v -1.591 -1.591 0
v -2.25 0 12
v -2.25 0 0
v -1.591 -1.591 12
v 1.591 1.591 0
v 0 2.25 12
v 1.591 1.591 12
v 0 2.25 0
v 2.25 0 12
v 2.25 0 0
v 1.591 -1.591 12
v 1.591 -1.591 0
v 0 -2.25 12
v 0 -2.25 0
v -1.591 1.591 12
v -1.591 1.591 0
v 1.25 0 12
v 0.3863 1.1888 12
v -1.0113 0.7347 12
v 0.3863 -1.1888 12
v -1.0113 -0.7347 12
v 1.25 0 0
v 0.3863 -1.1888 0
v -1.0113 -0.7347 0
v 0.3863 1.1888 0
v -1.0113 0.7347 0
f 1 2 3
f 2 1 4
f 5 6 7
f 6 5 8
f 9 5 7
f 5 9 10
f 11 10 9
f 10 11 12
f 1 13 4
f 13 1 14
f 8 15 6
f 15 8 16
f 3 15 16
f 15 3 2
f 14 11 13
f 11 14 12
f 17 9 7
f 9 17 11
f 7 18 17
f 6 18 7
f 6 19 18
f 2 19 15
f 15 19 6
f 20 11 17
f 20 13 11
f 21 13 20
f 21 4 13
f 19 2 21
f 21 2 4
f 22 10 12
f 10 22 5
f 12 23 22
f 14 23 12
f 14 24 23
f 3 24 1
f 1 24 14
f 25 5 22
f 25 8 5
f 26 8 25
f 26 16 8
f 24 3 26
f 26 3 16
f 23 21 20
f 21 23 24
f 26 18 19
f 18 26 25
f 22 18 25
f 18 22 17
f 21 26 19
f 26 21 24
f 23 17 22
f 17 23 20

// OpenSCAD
// Uncomment before final render
//$fa = 0.01;
//$fs = 0.25;

module xAxisCameraSpacer() {
  difference() {
    cylinder(12, 2.25, 2.25);
    translate([0, 0, -1]) {
      cylinder(14, 1.25, 1.25);
    }
  }
}

xAxisCameraSpacer();
